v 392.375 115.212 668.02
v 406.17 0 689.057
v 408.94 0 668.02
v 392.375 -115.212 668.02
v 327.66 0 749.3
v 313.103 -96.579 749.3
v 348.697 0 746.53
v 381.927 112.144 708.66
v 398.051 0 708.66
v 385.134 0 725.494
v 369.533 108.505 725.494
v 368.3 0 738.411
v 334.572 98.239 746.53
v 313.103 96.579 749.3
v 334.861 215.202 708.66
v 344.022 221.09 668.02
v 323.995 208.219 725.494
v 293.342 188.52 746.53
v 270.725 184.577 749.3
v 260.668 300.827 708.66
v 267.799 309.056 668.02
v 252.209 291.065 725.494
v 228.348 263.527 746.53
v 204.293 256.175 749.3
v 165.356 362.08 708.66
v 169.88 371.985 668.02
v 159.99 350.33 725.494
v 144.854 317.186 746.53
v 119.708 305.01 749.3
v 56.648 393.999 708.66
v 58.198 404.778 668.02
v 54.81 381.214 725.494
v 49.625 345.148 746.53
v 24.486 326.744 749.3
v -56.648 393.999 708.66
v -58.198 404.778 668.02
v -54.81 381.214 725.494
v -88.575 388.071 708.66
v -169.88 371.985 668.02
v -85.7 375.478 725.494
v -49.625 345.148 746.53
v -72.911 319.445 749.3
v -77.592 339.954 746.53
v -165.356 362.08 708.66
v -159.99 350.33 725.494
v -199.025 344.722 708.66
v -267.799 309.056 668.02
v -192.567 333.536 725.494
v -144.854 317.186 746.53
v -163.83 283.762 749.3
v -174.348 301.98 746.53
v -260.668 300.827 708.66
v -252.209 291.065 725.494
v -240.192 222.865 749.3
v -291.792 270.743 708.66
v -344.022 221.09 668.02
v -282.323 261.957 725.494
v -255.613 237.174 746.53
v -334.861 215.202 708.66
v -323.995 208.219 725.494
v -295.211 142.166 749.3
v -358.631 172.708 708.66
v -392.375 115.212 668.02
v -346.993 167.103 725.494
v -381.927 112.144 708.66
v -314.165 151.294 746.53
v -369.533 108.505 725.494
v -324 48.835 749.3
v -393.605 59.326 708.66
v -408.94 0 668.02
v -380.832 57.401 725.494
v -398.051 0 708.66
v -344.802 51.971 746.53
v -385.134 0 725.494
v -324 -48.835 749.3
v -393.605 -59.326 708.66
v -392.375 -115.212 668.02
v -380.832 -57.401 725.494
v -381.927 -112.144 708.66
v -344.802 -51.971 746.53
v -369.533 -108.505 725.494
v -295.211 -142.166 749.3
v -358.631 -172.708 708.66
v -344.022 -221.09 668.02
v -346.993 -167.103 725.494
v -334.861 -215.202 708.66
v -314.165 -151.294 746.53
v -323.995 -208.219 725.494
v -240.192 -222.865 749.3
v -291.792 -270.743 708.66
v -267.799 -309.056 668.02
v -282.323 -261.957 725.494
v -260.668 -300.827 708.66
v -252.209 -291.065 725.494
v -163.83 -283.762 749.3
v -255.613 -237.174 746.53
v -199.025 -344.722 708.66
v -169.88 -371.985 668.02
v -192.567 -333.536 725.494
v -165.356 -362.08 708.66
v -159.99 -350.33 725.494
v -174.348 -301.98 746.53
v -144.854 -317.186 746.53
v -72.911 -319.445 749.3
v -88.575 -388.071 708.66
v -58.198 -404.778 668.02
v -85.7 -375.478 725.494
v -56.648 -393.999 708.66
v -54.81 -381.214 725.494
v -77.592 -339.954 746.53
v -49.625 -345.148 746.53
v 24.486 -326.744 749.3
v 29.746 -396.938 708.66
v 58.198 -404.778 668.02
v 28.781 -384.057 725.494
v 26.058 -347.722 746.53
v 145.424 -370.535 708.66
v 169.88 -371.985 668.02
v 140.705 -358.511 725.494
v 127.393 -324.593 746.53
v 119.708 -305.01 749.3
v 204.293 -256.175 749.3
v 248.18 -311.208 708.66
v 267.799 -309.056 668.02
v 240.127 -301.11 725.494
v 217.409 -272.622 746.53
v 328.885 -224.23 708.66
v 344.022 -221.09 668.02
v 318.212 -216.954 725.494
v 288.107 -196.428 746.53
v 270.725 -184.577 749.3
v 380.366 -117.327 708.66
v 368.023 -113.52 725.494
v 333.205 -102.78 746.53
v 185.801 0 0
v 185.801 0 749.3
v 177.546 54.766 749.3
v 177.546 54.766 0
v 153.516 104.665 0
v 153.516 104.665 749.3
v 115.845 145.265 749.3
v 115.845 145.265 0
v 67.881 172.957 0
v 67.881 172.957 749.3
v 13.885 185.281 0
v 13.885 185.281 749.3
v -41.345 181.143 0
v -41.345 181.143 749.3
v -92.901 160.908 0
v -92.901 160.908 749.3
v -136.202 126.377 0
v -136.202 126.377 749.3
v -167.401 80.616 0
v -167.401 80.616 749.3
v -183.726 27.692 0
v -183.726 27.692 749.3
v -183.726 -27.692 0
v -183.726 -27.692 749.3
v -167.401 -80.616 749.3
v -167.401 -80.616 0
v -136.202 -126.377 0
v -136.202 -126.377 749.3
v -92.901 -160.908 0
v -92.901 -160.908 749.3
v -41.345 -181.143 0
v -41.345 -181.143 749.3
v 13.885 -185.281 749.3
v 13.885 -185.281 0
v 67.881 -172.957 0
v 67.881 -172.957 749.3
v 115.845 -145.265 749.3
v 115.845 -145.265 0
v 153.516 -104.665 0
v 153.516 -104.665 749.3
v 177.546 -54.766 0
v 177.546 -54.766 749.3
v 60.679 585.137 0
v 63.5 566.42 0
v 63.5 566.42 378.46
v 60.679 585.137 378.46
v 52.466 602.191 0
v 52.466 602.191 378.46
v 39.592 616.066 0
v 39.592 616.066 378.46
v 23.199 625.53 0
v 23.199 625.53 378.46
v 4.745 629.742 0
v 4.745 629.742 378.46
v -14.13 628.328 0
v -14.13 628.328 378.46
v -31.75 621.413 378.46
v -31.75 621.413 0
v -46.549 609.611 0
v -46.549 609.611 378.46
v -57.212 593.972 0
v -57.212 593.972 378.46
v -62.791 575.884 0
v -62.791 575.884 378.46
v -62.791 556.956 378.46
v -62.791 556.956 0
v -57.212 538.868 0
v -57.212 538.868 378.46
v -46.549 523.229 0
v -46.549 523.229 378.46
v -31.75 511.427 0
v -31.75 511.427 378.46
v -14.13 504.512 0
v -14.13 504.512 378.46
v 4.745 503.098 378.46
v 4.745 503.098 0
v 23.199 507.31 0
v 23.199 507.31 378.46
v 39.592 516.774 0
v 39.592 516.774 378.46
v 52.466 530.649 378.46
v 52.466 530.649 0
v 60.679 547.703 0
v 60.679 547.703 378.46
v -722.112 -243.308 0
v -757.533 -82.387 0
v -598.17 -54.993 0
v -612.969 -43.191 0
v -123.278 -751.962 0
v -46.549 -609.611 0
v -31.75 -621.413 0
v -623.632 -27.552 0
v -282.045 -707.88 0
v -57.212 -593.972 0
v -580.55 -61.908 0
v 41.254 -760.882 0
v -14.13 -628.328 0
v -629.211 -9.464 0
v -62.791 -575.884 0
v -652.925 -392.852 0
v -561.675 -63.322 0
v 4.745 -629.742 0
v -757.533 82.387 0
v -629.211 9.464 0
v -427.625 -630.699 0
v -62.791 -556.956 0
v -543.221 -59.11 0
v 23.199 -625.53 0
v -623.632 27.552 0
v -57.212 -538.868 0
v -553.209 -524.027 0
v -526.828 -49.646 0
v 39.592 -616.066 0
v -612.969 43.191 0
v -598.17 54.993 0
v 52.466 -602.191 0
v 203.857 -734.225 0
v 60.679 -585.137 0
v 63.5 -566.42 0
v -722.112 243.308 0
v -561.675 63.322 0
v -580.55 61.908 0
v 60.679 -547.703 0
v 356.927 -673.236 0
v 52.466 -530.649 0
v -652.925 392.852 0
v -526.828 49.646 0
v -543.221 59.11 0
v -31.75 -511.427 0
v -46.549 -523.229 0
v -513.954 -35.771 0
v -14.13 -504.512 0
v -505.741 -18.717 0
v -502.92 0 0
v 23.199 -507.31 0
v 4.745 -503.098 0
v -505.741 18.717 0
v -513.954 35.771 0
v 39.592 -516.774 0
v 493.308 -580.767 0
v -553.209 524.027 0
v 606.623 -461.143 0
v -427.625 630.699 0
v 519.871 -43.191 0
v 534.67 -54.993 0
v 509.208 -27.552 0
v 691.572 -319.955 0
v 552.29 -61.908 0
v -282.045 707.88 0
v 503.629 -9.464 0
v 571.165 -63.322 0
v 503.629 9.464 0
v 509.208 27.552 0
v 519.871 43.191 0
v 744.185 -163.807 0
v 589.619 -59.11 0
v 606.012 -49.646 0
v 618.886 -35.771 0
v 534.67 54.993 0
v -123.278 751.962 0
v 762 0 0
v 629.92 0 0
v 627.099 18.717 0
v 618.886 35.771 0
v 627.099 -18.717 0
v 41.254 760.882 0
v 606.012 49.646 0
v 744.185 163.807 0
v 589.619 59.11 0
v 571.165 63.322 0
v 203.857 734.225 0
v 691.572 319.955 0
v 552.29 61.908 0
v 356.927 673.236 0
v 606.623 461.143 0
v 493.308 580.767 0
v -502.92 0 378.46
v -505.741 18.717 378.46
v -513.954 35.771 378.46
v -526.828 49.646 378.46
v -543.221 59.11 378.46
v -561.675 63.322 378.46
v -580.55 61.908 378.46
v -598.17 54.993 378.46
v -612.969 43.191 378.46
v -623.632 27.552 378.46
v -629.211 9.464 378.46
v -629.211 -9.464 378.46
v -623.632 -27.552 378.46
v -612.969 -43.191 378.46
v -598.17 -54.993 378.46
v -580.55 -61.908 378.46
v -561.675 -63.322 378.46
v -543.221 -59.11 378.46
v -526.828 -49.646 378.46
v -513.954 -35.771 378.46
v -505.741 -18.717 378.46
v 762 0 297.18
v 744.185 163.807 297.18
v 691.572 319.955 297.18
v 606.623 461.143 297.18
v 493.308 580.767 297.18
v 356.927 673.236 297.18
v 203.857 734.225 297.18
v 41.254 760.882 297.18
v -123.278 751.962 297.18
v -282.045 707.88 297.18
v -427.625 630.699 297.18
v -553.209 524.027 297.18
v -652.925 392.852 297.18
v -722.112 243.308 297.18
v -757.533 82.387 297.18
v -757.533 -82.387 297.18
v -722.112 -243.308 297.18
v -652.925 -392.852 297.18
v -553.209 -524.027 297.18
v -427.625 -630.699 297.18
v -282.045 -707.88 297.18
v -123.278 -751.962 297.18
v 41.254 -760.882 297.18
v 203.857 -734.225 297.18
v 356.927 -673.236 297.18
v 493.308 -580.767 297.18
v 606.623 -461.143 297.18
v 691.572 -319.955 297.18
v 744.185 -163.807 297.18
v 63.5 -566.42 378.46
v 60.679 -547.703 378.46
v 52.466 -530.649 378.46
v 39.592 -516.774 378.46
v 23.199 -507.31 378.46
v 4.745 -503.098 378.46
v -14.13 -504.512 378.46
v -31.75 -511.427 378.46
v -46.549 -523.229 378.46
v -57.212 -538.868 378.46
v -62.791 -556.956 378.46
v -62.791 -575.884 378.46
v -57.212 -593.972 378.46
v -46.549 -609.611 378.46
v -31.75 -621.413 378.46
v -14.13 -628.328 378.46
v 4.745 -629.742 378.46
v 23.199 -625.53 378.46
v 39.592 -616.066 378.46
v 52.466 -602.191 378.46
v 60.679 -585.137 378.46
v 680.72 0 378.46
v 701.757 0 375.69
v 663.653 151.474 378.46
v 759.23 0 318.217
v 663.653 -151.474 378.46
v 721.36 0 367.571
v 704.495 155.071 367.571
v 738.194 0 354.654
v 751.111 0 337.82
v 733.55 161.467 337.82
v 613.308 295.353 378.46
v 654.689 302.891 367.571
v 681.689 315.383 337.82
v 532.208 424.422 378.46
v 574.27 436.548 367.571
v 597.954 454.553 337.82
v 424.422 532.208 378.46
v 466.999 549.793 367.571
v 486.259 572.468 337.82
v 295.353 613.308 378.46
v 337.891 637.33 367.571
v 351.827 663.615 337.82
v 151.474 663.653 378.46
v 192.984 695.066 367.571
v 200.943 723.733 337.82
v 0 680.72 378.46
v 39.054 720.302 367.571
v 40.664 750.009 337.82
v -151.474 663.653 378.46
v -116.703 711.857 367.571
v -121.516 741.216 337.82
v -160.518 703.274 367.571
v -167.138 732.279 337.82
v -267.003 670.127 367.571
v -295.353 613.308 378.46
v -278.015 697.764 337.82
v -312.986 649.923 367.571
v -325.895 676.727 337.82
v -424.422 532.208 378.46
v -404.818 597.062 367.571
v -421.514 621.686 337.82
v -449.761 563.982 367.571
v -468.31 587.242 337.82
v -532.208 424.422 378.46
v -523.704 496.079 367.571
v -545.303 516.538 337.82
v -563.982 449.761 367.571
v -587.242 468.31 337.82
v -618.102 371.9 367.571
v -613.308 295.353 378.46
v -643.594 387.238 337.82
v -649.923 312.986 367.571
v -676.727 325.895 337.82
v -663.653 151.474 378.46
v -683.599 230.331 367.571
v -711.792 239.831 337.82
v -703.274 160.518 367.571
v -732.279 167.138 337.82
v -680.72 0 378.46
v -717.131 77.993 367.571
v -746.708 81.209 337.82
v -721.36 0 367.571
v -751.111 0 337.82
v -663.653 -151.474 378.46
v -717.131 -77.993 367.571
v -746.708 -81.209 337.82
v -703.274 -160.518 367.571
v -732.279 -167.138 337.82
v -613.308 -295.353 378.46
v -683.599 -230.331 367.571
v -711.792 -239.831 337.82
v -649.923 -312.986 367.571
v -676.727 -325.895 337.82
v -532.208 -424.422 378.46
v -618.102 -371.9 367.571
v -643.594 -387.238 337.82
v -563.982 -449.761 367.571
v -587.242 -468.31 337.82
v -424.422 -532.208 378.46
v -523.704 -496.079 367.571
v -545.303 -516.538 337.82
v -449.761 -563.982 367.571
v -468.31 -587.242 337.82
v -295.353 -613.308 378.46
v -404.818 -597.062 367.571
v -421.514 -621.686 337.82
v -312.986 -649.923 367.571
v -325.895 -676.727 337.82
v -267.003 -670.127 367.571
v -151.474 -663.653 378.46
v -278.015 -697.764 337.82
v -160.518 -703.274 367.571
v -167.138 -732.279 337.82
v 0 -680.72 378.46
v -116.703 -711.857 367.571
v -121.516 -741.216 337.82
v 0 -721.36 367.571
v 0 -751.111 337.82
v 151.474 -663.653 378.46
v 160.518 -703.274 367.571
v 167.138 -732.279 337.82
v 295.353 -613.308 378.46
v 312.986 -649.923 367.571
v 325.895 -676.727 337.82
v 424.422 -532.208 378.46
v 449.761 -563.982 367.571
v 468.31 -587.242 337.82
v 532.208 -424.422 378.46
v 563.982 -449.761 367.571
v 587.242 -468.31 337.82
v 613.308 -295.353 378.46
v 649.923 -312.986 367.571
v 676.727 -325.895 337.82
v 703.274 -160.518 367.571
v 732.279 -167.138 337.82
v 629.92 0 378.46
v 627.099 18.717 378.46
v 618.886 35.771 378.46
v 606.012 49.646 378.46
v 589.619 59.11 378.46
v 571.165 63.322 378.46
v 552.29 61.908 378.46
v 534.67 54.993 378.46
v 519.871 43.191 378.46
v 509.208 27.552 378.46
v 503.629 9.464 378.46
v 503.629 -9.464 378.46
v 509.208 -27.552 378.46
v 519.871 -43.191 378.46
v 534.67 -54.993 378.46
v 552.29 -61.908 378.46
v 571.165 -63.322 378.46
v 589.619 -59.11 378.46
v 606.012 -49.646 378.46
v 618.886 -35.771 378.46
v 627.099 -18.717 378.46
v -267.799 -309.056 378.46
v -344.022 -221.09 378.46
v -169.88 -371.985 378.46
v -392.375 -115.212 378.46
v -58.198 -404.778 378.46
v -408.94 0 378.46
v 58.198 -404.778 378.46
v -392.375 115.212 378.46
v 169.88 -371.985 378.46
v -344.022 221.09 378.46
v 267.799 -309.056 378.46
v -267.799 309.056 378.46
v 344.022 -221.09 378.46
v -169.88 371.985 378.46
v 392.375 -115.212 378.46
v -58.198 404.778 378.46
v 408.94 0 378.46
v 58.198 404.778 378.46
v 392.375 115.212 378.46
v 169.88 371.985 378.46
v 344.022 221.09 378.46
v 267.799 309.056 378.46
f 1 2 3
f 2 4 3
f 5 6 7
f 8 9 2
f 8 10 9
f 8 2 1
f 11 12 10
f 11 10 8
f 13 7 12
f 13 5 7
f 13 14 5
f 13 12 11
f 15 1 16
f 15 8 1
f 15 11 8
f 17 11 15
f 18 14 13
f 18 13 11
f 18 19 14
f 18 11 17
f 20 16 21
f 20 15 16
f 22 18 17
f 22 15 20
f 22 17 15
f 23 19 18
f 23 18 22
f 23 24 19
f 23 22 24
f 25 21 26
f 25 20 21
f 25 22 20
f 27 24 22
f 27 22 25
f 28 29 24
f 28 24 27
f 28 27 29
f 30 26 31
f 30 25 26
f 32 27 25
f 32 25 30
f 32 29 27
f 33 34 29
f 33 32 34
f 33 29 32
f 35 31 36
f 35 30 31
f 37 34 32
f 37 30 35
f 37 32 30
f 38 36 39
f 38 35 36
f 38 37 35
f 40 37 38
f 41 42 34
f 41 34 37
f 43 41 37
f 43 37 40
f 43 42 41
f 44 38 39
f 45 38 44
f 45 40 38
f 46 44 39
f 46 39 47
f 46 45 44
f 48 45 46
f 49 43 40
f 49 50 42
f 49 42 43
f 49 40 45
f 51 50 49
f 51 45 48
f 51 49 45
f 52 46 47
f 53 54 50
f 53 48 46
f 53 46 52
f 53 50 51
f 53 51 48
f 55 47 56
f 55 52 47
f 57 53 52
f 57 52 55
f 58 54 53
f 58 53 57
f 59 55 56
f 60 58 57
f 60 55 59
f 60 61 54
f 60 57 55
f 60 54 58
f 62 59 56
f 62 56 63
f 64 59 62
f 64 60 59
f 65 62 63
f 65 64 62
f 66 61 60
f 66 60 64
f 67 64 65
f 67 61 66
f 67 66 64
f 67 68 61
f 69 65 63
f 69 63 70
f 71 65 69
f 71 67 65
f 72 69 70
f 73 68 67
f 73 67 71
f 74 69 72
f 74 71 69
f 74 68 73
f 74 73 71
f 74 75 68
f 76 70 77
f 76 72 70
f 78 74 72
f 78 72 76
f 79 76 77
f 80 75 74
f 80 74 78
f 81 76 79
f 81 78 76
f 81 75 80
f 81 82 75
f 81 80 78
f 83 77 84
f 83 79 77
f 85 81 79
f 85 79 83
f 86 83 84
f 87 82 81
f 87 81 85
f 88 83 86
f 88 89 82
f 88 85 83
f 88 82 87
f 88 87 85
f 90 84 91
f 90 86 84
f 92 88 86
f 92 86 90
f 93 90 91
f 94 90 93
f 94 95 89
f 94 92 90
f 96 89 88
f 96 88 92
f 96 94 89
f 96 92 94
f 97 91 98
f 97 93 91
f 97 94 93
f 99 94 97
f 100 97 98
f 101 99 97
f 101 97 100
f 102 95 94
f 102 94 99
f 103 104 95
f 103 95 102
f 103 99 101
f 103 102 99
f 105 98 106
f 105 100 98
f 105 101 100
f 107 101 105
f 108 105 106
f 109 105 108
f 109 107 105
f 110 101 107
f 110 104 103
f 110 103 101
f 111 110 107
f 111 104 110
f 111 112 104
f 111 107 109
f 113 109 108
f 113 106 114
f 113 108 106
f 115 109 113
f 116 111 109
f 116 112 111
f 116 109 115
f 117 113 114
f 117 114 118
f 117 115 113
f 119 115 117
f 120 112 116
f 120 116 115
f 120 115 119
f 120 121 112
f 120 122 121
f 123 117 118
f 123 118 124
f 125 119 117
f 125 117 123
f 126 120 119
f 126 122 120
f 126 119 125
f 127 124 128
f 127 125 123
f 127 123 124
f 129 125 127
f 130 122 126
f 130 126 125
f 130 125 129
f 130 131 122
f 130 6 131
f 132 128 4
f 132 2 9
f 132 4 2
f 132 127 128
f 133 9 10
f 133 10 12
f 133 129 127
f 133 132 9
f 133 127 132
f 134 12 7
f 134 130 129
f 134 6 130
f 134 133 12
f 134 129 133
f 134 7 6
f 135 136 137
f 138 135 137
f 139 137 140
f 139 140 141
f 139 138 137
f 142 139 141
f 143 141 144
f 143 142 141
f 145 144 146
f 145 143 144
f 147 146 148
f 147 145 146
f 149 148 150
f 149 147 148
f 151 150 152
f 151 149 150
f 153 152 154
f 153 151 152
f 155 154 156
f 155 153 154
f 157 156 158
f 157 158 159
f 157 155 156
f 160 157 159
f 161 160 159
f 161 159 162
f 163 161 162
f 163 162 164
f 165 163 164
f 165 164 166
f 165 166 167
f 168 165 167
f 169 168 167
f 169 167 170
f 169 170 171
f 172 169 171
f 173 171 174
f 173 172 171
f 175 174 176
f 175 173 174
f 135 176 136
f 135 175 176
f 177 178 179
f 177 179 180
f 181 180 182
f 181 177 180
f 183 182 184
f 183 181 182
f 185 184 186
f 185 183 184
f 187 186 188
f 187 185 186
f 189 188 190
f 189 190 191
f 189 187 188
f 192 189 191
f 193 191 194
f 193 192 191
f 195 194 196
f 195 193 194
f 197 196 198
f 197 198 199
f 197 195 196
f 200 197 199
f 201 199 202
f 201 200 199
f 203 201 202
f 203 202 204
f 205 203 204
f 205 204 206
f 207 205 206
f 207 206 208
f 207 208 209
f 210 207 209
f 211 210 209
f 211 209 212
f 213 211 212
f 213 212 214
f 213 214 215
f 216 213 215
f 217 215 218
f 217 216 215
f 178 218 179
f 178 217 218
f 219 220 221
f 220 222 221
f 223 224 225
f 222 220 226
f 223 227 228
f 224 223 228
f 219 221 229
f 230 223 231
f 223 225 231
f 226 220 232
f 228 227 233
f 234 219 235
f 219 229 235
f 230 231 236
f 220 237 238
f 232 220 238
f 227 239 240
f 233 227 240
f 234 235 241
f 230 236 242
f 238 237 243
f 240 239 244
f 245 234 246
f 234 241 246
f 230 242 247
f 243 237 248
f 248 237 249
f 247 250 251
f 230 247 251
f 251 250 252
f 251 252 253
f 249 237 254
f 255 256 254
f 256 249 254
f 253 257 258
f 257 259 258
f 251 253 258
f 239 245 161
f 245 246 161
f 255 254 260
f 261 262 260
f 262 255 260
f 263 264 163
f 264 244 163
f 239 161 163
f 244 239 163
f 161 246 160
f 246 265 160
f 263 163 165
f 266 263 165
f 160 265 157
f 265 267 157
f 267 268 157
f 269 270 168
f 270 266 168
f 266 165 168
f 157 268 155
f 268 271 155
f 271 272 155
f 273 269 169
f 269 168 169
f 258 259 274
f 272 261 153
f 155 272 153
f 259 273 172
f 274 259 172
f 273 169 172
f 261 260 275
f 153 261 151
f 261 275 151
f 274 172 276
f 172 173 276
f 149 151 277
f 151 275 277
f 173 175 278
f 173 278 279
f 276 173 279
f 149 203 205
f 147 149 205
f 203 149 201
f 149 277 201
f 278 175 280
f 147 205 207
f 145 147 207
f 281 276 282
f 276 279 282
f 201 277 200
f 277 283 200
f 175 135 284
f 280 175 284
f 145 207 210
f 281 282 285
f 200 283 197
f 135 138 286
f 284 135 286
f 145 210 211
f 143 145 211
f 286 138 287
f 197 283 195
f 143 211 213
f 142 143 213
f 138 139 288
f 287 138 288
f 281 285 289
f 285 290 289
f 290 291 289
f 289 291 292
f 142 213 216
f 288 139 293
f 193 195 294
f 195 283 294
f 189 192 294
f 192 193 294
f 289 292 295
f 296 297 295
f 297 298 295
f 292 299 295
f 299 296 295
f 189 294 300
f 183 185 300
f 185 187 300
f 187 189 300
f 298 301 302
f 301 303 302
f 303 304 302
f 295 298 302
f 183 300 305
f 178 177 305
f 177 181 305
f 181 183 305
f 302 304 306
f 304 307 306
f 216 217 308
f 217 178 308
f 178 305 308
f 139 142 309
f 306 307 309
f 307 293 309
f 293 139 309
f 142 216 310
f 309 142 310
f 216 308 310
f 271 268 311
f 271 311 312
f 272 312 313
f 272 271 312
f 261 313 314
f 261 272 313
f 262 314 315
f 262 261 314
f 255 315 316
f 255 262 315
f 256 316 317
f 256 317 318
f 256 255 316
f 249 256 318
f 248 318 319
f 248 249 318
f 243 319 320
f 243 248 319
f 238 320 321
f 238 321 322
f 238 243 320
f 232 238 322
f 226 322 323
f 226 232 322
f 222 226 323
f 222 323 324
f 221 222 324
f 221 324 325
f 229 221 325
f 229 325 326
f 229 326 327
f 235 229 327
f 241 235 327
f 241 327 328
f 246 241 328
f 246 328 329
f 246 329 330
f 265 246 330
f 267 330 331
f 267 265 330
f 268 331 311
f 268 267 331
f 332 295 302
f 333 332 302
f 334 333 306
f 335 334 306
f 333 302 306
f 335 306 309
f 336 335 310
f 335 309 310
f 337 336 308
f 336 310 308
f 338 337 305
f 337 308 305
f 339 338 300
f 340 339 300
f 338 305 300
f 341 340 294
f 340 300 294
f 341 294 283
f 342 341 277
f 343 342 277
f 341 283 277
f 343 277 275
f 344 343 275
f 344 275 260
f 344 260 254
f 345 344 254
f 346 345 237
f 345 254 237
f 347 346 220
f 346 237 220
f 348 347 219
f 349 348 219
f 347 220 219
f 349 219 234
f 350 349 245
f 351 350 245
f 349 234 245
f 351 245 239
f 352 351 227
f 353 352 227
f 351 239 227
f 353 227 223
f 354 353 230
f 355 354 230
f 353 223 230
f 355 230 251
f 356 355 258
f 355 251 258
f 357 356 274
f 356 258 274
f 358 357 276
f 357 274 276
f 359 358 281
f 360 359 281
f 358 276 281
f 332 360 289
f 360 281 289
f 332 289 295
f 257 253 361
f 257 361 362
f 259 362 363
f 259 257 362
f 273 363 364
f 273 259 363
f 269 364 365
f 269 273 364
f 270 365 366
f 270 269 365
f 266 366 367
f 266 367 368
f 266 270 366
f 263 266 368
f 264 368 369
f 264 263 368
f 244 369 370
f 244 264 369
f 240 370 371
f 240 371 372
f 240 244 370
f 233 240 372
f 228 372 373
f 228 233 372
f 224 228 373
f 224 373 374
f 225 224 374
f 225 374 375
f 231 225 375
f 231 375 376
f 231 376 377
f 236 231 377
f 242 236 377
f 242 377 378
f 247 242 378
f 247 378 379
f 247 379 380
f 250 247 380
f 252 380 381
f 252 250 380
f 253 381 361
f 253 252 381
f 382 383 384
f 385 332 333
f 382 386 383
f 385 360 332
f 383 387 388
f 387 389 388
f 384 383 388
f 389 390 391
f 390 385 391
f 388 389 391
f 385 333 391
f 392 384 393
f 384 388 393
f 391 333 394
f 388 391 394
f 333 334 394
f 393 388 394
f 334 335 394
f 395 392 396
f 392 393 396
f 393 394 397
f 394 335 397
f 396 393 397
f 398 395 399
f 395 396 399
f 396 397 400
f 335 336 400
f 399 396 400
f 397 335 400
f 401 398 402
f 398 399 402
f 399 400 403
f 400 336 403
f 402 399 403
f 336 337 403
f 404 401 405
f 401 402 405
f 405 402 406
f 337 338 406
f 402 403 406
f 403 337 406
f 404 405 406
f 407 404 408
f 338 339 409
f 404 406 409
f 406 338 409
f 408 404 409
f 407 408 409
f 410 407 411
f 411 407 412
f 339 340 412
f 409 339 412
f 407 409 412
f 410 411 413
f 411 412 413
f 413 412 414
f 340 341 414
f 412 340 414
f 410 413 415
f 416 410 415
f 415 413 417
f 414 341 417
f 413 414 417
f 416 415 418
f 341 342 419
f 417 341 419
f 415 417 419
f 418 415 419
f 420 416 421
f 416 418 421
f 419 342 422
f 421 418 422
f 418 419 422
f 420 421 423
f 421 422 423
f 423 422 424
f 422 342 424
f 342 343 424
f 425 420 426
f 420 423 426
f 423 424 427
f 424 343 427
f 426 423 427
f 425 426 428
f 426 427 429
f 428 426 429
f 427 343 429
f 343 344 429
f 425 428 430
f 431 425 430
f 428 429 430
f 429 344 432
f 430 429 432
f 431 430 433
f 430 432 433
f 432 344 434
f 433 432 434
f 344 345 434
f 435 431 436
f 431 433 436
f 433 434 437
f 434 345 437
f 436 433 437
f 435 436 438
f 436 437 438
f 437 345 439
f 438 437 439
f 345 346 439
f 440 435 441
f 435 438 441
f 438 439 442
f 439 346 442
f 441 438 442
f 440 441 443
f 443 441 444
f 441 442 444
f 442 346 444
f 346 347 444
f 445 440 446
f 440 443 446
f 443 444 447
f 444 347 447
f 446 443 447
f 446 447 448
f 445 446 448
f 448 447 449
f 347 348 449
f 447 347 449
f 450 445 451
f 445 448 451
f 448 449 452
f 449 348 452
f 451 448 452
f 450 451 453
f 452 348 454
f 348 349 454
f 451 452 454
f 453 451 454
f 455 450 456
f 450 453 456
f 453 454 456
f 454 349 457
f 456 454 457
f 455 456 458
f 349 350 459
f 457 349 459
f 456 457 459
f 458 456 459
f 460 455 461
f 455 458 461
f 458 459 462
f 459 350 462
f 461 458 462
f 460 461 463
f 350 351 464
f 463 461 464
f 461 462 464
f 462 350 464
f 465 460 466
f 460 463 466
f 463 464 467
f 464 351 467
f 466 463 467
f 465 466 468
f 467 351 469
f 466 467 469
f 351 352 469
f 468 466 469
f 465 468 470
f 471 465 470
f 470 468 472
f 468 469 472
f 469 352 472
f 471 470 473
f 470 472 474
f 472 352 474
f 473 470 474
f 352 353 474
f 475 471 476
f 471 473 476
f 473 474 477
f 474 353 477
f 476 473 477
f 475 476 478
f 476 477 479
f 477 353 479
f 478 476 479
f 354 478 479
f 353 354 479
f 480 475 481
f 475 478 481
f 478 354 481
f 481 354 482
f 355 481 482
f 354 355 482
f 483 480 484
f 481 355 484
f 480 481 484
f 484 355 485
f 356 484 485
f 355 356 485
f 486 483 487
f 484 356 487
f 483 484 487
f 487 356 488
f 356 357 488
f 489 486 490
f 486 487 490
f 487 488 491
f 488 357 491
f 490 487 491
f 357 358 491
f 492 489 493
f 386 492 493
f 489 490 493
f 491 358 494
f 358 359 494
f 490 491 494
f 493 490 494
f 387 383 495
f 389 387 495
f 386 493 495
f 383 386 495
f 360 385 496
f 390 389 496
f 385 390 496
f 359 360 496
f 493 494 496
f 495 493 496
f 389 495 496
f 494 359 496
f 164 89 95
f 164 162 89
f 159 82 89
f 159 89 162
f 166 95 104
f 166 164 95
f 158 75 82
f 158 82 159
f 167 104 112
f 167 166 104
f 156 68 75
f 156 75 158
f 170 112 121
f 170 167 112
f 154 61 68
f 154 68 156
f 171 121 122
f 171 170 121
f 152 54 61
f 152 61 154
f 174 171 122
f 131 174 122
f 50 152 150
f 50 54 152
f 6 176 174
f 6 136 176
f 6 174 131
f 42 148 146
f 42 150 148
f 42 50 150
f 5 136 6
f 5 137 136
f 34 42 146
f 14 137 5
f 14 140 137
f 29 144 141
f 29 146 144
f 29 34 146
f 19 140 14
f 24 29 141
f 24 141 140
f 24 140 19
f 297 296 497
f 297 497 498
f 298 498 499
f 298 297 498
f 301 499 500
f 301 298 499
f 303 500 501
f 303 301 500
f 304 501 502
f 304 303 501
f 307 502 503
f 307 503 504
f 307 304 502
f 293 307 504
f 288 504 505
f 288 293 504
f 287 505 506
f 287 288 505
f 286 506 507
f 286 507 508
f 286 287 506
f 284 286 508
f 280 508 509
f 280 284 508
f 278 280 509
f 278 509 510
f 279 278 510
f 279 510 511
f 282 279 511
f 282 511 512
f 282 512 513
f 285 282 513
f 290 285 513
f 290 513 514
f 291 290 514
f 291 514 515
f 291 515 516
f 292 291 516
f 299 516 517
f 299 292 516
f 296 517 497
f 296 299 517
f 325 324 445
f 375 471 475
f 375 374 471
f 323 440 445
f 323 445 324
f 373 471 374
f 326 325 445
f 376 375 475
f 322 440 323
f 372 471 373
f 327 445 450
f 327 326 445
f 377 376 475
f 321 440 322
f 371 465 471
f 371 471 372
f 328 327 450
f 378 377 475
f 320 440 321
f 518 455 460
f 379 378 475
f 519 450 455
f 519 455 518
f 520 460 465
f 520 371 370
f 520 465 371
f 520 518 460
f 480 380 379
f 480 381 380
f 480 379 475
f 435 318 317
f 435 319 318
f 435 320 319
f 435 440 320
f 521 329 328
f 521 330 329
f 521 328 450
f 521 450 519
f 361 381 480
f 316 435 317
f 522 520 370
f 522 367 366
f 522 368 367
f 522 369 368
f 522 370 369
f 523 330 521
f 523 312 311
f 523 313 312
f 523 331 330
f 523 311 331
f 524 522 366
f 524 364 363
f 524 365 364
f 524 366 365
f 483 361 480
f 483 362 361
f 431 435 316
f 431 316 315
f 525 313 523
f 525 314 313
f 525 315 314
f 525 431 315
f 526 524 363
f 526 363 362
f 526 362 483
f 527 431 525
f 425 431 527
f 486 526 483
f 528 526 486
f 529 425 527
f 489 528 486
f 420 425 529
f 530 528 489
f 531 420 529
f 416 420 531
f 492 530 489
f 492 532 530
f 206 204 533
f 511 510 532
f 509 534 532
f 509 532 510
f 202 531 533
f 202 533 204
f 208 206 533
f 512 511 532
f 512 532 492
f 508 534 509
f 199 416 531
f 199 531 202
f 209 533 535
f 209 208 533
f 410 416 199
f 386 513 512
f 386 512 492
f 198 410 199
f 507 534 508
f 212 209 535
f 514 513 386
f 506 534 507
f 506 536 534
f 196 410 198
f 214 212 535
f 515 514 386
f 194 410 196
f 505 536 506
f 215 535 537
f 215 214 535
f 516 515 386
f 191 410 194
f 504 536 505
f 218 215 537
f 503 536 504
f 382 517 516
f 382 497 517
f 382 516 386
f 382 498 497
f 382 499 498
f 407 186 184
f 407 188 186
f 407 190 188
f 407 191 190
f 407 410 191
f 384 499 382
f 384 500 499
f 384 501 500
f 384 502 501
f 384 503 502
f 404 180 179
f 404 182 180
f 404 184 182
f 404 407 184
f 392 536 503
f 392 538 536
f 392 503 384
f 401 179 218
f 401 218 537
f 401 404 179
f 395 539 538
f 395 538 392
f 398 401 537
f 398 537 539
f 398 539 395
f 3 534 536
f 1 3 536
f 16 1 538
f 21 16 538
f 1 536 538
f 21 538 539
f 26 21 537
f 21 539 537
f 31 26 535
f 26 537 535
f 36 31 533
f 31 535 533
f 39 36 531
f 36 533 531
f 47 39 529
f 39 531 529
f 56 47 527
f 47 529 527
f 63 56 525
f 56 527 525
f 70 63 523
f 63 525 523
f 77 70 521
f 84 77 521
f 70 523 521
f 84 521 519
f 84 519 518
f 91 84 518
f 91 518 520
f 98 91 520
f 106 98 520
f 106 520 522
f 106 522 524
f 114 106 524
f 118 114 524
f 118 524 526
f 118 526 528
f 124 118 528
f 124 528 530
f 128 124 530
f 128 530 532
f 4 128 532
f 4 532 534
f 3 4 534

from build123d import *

# Parameters (mm, degrees)
F0_R     = 408.94
F0_R_2   = 185.801
F1_DEPTH = 749.3
F0_R_3   = 762
F0_R_4   = 63.5
F2_DEPTH = 378.46
F3_R     = 81.28
F4_R     = 81.28


with BuildPart() as f1:
    # F0 (on Top) → F1 (new body)
    with BuildSketch(Plane.XY):
        Circle(F0_R)
        Circle(F0_R_2, mode=Mode.SUBTRACT)
    extrude(amount=F1_DEPTH)

    # F0 (on Top) → F2 (join)
    with BuildSketch(Plane.XY):
        Circle(F0_R_3)
        with Locations((0, -566.42)):
            Circle(F0_R_4, mode=Mode.SUBTRACT)
        with Locations((-566.42, 0)):
            Circle(F0_R_4, mode=Mode.SUBTRACT)
        Circle(F0_R, mode=Mode.SUBTRACT)
        with Locations((566.42, 0)):
            Circle(F0_R_4, mode=Mode.SUBTRACT)
        with Locations((0, 566.42)):
            Circle(F0_R_4, mode=Mode.SUBTRACT)
    extrude(amount=F2_DEPTH)

    # F3
    f3_edges = [f1.edges().sort_by_distance(p)[0] for p in [
        (-408.94, 0, 749.3),
    ]]
    fillet(f3_edges, radius=F3_R)

    # F4
    f4_edges = [f1.edges().sort_by_distance(p)[0] for p in [
        (-762, 0, 378.46),
    ]]
    fillet(f4_edges, radius=F4_R)


solid = f1.part
